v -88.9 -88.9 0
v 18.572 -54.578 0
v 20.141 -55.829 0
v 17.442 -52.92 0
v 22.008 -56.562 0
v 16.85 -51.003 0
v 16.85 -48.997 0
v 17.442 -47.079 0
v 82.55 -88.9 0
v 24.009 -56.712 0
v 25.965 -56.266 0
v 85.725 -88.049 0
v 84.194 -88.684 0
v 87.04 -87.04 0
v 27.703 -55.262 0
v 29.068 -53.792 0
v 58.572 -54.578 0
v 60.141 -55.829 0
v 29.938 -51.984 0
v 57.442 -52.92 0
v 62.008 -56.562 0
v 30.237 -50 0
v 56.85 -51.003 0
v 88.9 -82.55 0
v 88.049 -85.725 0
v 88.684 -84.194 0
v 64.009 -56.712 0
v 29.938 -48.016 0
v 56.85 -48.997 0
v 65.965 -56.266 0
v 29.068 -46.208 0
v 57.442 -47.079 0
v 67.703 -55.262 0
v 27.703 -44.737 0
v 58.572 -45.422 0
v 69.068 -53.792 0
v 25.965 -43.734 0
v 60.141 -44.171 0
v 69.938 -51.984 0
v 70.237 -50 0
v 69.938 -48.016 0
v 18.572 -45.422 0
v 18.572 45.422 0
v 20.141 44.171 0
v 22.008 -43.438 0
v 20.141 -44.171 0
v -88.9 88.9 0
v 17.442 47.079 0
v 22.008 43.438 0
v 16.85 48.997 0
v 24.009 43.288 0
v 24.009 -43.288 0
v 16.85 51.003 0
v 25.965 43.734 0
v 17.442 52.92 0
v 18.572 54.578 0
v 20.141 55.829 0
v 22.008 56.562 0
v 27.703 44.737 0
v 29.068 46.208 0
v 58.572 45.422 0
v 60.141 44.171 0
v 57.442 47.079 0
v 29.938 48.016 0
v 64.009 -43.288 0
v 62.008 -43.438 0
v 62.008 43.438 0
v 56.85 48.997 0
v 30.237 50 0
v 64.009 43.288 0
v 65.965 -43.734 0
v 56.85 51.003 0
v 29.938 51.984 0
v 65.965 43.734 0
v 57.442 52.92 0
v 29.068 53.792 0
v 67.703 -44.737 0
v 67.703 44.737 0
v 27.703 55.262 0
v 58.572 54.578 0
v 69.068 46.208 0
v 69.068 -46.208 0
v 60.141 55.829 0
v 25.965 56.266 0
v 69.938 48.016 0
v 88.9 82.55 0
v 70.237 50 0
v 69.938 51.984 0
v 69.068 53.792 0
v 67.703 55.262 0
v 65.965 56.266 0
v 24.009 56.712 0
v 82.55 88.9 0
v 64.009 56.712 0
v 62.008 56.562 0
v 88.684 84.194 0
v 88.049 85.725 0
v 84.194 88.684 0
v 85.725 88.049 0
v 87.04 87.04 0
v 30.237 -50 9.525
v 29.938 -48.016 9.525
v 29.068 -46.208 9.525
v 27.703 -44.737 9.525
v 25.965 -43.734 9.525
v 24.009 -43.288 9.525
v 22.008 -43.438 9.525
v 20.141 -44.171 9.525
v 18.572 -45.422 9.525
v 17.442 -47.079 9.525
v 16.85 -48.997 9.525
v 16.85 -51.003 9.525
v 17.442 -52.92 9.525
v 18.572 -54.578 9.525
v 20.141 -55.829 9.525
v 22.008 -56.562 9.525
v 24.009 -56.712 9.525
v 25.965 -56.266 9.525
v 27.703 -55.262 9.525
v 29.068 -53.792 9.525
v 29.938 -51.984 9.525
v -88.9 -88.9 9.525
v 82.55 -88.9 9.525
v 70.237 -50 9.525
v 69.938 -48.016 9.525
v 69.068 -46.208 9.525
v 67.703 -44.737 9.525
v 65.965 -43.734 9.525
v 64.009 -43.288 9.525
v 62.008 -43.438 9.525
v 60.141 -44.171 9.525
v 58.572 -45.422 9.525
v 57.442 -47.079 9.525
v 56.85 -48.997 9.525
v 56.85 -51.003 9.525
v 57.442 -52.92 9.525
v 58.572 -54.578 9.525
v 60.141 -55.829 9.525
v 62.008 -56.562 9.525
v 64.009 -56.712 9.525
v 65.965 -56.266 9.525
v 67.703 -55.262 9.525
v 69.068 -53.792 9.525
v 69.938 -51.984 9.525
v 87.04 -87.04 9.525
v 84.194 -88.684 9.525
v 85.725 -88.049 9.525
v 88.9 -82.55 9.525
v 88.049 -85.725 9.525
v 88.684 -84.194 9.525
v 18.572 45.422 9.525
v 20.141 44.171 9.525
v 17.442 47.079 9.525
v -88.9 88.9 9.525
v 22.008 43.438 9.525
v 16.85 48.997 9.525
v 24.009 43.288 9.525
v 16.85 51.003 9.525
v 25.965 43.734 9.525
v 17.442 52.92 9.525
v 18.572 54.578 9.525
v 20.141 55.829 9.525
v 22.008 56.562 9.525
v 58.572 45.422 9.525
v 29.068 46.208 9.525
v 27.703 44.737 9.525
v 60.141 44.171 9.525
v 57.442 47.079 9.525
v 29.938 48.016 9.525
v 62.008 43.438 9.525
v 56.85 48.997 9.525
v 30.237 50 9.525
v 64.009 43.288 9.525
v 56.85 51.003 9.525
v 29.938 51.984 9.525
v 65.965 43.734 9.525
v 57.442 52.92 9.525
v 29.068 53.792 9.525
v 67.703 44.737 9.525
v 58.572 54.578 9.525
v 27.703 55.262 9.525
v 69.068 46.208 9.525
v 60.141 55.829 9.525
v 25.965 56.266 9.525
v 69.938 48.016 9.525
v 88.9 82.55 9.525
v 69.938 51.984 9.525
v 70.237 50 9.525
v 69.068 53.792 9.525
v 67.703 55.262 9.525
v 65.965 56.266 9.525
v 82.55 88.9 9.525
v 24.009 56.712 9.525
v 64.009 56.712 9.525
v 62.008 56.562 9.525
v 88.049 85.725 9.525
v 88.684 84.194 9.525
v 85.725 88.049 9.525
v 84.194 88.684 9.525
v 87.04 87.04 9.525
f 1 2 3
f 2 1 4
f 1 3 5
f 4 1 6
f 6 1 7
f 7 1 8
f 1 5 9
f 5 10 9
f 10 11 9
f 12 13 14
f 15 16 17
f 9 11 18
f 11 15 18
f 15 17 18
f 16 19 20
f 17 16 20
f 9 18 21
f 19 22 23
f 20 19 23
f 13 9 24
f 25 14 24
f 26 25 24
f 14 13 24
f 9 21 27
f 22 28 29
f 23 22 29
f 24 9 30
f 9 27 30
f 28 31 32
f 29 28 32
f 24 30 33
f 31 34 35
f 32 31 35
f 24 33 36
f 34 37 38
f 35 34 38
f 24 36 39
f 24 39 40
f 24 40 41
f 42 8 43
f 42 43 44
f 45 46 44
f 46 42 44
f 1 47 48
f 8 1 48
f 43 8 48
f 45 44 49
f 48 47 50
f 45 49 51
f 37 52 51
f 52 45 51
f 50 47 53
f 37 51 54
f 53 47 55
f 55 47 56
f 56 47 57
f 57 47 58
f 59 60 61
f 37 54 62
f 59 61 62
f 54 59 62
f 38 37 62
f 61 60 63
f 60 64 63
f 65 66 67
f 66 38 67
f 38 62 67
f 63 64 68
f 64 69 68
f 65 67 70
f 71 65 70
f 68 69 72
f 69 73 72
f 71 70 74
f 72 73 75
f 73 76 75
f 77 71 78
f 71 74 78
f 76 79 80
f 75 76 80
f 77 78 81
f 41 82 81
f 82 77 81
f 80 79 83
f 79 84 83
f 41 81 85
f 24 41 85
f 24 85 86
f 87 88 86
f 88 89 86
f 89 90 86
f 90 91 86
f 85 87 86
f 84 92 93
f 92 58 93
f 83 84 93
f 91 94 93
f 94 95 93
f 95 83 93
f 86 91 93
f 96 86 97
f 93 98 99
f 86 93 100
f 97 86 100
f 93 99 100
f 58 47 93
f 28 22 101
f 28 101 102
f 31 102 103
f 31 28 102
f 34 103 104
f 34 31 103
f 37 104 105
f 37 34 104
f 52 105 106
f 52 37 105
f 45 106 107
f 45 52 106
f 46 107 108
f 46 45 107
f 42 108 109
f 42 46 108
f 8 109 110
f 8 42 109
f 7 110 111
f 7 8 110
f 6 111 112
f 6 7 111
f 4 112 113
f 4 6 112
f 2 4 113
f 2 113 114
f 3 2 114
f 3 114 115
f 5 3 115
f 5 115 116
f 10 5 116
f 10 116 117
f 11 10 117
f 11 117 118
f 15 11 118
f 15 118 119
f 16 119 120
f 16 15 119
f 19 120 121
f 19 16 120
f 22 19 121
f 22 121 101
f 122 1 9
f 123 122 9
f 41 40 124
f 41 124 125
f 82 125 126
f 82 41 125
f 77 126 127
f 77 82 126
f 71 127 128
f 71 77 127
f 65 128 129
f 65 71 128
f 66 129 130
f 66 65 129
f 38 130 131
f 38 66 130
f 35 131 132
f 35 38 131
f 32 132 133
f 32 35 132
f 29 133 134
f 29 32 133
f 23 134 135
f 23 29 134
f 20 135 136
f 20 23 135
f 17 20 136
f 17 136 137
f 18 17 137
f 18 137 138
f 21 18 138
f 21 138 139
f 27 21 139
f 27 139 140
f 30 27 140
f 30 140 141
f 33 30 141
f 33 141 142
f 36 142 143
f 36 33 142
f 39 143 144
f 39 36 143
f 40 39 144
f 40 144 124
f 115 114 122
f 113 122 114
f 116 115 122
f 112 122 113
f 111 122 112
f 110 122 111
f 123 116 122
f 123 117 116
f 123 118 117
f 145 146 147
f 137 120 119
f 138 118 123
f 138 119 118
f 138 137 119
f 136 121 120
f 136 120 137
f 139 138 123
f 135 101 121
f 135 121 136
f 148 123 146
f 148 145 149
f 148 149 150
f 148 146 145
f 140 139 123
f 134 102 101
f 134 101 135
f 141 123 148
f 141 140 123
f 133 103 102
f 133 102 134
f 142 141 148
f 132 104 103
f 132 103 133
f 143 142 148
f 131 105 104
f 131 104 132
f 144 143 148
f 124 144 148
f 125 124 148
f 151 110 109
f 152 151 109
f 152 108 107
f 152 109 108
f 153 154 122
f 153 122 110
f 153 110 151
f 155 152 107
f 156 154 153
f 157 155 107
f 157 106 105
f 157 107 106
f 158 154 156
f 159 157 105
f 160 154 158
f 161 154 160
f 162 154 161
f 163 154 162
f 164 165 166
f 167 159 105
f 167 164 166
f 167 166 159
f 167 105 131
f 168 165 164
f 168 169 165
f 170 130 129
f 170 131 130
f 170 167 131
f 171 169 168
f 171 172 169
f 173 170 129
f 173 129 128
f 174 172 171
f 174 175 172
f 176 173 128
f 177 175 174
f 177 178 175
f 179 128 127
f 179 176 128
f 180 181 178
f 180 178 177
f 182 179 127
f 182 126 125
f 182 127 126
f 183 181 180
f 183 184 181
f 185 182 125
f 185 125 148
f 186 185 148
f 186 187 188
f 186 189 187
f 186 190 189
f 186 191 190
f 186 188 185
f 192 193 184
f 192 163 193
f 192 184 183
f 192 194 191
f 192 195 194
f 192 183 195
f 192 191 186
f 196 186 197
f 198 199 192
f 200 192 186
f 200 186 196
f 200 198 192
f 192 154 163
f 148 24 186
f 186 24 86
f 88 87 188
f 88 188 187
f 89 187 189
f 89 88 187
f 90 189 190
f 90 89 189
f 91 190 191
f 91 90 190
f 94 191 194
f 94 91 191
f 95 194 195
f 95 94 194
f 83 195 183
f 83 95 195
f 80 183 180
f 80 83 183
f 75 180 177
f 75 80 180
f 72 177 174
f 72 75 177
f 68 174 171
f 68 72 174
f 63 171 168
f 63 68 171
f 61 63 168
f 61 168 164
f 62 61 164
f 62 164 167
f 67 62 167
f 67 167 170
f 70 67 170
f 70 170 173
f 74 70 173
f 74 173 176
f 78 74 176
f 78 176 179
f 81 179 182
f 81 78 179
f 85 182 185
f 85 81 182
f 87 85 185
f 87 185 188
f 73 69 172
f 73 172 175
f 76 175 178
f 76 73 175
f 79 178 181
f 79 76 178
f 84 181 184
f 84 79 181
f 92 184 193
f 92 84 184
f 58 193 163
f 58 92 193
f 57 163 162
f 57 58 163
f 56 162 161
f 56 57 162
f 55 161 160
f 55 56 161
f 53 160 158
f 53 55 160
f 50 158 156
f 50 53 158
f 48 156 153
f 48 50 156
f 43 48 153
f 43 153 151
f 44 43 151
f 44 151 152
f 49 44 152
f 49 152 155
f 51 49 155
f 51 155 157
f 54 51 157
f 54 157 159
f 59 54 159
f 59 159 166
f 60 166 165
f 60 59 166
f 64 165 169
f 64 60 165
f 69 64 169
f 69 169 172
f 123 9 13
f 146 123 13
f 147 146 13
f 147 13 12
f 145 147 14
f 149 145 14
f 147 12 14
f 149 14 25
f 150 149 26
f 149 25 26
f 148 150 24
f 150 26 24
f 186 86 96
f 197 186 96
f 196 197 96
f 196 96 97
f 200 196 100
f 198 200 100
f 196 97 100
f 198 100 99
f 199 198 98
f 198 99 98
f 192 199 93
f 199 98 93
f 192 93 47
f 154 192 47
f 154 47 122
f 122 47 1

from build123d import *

# Parameters (mm, degrees)
F0_R     = 6.731
F1_DEPTH = 9.525


with BuildPart() as f1:
    # F0 (on Top) → F1 (new body)
    with BuildSketch(Plane.XY):
        with BuildLine():
            ThreePointArc((82.55, -88.9), (87.040128, -87.040128), (88.9, -82.55))
            Line((88.9, -82.55), (88.9, 82.55))
            ThreePointArc((88.9, 82.55), (87.040128, 87.040128), (82.55, 88.9))
            Line((82.55, 88.9), (-88.9, 88.9))
            Line((-88.9, 88.9), (-88.9, -88.9))
            Line((-88.9, -88.9), (82.55, -88.9))
        make_face()
        with Locations((23.506227, -49.9999)):
            Circle(F0_R, mode=Mode.SUBTRACT)
        with Locations((63.506147, -49.9999)):
            Circle(F0_R, mode=Mode.SUBTRACT)
        with Locations((23.506227, 49.9999)):
            Circle(F0_R, mode=Mode.SUBTRACT)
        with Locations((63.506147, 49.9999)):
            Circle(F0_R, mode=Mode.SUBTRACT)
    extrude(amount=F1_DEPTH)


solid = f1.part
